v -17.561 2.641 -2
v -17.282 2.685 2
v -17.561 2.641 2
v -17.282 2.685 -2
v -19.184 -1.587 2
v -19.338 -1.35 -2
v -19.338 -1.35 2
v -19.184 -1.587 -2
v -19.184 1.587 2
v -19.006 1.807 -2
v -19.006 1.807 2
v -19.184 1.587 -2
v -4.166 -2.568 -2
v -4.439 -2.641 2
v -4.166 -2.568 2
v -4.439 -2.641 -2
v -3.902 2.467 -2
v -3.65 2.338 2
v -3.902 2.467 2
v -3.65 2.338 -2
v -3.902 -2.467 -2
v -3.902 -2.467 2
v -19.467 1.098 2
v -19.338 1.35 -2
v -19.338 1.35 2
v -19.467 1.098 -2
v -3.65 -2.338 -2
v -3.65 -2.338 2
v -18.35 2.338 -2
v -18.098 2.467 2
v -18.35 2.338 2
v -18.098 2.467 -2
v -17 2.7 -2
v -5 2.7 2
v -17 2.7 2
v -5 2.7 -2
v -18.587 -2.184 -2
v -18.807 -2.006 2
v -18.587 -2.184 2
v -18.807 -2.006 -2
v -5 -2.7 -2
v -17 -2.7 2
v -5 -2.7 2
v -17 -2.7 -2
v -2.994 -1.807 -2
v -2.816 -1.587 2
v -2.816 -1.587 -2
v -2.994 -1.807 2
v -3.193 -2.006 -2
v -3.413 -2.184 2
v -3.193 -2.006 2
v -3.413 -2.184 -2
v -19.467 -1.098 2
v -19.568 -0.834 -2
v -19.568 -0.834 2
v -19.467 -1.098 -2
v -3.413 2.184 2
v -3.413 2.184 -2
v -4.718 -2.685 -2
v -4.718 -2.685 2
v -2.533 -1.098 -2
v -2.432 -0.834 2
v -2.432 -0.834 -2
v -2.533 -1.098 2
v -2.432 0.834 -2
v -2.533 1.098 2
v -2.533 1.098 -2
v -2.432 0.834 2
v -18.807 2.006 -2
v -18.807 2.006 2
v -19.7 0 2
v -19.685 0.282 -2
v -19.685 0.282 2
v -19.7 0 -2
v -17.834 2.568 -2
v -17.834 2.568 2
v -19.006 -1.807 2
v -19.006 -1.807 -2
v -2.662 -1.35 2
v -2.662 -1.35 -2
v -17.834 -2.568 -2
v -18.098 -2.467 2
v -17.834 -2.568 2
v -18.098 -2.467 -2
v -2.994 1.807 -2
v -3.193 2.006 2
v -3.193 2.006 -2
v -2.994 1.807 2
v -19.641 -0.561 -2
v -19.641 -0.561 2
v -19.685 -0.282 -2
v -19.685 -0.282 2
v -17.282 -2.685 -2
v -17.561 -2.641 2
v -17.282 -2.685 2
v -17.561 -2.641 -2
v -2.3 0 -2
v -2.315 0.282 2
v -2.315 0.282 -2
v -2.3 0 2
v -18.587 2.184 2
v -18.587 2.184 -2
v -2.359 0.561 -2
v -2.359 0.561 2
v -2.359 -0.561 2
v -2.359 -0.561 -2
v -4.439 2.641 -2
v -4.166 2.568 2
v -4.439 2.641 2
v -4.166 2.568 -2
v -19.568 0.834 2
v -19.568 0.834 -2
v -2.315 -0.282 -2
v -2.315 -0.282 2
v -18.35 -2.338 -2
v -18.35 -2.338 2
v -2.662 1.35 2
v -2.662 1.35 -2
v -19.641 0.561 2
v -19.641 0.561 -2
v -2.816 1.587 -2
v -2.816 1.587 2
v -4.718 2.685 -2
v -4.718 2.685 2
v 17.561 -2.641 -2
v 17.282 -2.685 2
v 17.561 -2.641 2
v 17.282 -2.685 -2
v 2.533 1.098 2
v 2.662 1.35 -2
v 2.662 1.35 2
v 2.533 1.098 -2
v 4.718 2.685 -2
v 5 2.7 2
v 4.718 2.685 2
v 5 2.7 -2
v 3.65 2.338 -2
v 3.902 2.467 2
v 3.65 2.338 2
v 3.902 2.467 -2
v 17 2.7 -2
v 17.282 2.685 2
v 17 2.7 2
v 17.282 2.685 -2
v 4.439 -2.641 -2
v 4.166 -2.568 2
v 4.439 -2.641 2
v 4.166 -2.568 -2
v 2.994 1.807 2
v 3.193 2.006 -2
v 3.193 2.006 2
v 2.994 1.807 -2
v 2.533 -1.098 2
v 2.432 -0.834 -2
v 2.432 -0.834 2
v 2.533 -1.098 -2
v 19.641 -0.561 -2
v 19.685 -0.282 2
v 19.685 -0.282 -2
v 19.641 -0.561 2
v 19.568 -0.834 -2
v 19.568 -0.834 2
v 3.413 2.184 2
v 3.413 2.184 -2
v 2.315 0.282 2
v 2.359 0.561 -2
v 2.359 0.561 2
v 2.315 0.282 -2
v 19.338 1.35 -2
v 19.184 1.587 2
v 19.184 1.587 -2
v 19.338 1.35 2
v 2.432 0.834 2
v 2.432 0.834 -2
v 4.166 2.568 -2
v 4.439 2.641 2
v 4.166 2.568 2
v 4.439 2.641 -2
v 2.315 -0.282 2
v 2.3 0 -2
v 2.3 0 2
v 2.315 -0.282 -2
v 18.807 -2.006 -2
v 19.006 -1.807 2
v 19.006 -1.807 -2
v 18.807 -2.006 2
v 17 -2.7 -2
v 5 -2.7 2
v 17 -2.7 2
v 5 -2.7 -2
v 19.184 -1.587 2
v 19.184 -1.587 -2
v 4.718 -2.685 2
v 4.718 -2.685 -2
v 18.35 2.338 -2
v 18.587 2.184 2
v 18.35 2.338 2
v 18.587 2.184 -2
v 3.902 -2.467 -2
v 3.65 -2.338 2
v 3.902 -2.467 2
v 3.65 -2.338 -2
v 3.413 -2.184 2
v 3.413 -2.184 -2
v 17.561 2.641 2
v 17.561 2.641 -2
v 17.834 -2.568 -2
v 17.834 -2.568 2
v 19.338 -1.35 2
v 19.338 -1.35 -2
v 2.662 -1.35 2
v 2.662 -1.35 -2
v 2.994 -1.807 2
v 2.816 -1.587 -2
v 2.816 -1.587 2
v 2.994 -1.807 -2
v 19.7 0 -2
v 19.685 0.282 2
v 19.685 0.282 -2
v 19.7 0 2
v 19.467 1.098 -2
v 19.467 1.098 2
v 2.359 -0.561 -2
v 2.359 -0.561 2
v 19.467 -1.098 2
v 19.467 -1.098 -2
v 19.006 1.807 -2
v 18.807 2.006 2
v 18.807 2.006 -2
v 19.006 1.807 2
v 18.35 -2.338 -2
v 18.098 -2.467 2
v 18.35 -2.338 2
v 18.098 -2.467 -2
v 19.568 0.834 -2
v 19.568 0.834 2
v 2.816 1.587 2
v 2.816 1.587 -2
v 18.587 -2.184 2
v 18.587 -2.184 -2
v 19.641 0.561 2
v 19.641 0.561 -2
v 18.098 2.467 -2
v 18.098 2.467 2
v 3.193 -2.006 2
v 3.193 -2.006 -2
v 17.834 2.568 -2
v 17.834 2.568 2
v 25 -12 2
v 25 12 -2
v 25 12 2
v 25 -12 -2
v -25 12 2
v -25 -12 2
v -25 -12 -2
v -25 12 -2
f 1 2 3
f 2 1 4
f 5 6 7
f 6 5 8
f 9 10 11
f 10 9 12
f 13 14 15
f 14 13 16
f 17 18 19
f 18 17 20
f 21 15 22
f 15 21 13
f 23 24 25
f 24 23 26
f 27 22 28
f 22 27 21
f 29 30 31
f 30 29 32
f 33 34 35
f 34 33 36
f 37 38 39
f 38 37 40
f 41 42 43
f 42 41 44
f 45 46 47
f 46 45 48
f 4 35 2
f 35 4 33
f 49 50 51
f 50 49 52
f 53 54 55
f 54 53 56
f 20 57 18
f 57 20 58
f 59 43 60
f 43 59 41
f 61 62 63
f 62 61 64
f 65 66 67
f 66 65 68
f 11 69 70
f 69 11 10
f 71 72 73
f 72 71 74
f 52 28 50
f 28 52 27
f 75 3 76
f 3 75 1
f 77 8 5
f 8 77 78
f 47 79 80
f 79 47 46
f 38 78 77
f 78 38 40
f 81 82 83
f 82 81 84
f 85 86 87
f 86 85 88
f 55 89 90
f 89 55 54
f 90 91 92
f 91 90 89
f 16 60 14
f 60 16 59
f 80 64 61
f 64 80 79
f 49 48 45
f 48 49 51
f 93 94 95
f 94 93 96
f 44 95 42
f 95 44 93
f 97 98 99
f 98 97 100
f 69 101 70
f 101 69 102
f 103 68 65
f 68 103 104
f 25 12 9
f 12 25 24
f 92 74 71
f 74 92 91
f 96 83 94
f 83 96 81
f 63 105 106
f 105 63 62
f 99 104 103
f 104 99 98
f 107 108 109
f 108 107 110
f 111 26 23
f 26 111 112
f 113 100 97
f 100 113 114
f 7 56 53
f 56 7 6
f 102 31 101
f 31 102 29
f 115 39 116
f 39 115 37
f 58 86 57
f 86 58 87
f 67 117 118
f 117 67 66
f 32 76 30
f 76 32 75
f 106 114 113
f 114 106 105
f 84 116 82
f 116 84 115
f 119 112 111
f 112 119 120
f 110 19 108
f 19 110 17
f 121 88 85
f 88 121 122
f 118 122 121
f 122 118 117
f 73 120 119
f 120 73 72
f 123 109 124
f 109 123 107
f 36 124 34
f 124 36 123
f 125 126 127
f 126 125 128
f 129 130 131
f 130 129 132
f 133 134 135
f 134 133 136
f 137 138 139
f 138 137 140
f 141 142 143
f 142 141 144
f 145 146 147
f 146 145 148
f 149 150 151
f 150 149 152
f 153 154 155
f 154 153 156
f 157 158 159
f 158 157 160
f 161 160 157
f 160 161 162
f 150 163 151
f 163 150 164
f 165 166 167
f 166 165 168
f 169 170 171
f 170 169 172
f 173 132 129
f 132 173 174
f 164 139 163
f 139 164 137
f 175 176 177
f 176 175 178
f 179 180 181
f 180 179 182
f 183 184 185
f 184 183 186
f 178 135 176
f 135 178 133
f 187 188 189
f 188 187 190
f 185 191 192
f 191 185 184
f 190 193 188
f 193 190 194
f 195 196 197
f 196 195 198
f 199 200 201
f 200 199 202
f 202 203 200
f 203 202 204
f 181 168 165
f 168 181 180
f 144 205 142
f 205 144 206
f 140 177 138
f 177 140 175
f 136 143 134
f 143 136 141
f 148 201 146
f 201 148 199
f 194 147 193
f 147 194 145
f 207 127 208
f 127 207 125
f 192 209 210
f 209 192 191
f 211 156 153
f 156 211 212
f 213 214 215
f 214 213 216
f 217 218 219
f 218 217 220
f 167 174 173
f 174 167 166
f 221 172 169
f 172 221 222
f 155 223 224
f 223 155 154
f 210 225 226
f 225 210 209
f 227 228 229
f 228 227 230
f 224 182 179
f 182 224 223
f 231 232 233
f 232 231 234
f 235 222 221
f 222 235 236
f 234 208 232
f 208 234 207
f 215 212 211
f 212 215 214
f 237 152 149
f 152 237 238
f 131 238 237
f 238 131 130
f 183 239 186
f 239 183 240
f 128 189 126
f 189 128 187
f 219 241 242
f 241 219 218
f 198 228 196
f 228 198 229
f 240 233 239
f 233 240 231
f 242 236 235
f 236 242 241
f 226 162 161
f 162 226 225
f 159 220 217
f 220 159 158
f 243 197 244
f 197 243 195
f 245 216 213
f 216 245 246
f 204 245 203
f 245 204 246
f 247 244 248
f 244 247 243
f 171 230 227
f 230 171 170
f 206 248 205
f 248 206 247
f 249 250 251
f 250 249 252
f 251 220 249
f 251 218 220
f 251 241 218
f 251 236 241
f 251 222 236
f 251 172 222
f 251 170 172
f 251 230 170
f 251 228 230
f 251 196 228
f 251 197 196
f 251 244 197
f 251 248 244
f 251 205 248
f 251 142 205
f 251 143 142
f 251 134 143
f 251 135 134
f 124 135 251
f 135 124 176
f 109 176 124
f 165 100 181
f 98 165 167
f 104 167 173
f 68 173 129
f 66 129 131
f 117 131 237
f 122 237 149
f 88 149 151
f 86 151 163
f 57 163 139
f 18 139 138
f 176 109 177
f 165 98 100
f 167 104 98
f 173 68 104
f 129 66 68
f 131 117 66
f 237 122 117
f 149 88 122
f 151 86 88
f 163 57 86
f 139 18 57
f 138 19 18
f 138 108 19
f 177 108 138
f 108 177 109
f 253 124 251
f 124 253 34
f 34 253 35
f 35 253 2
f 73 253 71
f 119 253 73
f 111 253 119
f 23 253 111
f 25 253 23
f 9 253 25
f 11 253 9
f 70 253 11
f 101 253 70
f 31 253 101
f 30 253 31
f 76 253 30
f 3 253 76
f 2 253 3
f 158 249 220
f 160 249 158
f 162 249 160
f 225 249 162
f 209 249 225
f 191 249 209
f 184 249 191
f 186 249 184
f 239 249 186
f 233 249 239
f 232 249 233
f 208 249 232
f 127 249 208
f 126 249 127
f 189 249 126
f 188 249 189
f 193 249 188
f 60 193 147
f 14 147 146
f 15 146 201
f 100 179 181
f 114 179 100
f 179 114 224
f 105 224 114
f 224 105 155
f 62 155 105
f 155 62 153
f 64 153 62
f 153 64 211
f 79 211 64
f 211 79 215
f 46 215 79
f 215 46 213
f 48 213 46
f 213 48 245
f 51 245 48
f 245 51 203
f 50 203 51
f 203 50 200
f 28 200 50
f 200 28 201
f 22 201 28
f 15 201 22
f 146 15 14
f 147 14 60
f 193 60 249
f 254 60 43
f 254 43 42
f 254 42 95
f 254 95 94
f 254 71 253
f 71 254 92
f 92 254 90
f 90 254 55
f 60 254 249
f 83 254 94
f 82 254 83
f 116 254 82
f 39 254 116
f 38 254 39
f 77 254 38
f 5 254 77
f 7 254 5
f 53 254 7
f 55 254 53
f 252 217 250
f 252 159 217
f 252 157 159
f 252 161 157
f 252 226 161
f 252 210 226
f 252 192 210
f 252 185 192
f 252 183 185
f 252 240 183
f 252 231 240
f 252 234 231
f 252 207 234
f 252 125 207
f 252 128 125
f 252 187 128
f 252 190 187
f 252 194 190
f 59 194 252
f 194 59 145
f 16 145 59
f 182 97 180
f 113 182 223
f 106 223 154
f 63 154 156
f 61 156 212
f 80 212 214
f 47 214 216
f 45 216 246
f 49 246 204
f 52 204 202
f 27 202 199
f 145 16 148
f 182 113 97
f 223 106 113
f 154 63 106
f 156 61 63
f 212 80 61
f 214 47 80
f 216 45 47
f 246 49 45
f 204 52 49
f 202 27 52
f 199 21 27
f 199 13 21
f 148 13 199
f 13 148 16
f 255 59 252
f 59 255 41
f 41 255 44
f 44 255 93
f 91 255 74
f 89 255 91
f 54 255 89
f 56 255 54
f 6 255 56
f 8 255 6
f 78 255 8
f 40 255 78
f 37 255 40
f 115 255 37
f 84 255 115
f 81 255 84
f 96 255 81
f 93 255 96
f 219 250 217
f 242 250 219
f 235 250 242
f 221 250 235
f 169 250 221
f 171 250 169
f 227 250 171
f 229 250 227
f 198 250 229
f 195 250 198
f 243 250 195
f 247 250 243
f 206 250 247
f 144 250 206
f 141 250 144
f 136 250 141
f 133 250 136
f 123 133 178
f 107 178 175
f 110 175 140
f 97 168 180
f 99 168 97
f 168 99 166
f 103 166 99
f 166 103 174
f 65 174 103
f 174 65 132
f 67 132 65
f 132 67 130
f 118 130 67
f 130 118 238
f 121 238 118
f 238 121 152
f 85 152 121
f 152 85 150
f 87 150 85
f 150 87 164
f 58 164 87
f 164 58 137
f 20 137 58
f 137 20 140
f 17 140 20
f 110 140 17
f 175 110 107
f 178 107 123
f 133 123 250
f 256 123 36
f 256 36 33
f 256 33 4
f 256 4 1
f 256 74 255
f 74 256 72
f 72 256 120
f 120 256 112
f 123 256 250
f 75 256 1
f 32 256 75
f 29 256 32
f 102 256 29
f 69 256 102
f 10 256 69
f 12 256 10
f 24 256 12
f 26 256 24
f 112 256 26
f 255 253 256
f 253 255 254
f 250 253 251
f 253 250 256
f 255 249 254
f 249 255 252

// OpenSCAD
// Slotted mounting plate.
$fn = 60;
eps = 0.02;
plate_l = 50;
plate_w = 24;
plate_t = 4;
slot_l = 12;
module slot(x) { hull() { translate([x-slot_l/2,0,-plate_t/2-eps]) cylinder(d=5.4,h=plate_t+2*eps); translate([x+slot_l/2,0,-plate_t/2-eps]) cylinder(d=5.4,h=plate_t+2*eps); } }
difference() { cube([plate_l,plate_w,plate_t],center=true); for(i=[0:1]) slot(-plate_l/2+14+i*(plate_l-28)/max(1,1)); }
